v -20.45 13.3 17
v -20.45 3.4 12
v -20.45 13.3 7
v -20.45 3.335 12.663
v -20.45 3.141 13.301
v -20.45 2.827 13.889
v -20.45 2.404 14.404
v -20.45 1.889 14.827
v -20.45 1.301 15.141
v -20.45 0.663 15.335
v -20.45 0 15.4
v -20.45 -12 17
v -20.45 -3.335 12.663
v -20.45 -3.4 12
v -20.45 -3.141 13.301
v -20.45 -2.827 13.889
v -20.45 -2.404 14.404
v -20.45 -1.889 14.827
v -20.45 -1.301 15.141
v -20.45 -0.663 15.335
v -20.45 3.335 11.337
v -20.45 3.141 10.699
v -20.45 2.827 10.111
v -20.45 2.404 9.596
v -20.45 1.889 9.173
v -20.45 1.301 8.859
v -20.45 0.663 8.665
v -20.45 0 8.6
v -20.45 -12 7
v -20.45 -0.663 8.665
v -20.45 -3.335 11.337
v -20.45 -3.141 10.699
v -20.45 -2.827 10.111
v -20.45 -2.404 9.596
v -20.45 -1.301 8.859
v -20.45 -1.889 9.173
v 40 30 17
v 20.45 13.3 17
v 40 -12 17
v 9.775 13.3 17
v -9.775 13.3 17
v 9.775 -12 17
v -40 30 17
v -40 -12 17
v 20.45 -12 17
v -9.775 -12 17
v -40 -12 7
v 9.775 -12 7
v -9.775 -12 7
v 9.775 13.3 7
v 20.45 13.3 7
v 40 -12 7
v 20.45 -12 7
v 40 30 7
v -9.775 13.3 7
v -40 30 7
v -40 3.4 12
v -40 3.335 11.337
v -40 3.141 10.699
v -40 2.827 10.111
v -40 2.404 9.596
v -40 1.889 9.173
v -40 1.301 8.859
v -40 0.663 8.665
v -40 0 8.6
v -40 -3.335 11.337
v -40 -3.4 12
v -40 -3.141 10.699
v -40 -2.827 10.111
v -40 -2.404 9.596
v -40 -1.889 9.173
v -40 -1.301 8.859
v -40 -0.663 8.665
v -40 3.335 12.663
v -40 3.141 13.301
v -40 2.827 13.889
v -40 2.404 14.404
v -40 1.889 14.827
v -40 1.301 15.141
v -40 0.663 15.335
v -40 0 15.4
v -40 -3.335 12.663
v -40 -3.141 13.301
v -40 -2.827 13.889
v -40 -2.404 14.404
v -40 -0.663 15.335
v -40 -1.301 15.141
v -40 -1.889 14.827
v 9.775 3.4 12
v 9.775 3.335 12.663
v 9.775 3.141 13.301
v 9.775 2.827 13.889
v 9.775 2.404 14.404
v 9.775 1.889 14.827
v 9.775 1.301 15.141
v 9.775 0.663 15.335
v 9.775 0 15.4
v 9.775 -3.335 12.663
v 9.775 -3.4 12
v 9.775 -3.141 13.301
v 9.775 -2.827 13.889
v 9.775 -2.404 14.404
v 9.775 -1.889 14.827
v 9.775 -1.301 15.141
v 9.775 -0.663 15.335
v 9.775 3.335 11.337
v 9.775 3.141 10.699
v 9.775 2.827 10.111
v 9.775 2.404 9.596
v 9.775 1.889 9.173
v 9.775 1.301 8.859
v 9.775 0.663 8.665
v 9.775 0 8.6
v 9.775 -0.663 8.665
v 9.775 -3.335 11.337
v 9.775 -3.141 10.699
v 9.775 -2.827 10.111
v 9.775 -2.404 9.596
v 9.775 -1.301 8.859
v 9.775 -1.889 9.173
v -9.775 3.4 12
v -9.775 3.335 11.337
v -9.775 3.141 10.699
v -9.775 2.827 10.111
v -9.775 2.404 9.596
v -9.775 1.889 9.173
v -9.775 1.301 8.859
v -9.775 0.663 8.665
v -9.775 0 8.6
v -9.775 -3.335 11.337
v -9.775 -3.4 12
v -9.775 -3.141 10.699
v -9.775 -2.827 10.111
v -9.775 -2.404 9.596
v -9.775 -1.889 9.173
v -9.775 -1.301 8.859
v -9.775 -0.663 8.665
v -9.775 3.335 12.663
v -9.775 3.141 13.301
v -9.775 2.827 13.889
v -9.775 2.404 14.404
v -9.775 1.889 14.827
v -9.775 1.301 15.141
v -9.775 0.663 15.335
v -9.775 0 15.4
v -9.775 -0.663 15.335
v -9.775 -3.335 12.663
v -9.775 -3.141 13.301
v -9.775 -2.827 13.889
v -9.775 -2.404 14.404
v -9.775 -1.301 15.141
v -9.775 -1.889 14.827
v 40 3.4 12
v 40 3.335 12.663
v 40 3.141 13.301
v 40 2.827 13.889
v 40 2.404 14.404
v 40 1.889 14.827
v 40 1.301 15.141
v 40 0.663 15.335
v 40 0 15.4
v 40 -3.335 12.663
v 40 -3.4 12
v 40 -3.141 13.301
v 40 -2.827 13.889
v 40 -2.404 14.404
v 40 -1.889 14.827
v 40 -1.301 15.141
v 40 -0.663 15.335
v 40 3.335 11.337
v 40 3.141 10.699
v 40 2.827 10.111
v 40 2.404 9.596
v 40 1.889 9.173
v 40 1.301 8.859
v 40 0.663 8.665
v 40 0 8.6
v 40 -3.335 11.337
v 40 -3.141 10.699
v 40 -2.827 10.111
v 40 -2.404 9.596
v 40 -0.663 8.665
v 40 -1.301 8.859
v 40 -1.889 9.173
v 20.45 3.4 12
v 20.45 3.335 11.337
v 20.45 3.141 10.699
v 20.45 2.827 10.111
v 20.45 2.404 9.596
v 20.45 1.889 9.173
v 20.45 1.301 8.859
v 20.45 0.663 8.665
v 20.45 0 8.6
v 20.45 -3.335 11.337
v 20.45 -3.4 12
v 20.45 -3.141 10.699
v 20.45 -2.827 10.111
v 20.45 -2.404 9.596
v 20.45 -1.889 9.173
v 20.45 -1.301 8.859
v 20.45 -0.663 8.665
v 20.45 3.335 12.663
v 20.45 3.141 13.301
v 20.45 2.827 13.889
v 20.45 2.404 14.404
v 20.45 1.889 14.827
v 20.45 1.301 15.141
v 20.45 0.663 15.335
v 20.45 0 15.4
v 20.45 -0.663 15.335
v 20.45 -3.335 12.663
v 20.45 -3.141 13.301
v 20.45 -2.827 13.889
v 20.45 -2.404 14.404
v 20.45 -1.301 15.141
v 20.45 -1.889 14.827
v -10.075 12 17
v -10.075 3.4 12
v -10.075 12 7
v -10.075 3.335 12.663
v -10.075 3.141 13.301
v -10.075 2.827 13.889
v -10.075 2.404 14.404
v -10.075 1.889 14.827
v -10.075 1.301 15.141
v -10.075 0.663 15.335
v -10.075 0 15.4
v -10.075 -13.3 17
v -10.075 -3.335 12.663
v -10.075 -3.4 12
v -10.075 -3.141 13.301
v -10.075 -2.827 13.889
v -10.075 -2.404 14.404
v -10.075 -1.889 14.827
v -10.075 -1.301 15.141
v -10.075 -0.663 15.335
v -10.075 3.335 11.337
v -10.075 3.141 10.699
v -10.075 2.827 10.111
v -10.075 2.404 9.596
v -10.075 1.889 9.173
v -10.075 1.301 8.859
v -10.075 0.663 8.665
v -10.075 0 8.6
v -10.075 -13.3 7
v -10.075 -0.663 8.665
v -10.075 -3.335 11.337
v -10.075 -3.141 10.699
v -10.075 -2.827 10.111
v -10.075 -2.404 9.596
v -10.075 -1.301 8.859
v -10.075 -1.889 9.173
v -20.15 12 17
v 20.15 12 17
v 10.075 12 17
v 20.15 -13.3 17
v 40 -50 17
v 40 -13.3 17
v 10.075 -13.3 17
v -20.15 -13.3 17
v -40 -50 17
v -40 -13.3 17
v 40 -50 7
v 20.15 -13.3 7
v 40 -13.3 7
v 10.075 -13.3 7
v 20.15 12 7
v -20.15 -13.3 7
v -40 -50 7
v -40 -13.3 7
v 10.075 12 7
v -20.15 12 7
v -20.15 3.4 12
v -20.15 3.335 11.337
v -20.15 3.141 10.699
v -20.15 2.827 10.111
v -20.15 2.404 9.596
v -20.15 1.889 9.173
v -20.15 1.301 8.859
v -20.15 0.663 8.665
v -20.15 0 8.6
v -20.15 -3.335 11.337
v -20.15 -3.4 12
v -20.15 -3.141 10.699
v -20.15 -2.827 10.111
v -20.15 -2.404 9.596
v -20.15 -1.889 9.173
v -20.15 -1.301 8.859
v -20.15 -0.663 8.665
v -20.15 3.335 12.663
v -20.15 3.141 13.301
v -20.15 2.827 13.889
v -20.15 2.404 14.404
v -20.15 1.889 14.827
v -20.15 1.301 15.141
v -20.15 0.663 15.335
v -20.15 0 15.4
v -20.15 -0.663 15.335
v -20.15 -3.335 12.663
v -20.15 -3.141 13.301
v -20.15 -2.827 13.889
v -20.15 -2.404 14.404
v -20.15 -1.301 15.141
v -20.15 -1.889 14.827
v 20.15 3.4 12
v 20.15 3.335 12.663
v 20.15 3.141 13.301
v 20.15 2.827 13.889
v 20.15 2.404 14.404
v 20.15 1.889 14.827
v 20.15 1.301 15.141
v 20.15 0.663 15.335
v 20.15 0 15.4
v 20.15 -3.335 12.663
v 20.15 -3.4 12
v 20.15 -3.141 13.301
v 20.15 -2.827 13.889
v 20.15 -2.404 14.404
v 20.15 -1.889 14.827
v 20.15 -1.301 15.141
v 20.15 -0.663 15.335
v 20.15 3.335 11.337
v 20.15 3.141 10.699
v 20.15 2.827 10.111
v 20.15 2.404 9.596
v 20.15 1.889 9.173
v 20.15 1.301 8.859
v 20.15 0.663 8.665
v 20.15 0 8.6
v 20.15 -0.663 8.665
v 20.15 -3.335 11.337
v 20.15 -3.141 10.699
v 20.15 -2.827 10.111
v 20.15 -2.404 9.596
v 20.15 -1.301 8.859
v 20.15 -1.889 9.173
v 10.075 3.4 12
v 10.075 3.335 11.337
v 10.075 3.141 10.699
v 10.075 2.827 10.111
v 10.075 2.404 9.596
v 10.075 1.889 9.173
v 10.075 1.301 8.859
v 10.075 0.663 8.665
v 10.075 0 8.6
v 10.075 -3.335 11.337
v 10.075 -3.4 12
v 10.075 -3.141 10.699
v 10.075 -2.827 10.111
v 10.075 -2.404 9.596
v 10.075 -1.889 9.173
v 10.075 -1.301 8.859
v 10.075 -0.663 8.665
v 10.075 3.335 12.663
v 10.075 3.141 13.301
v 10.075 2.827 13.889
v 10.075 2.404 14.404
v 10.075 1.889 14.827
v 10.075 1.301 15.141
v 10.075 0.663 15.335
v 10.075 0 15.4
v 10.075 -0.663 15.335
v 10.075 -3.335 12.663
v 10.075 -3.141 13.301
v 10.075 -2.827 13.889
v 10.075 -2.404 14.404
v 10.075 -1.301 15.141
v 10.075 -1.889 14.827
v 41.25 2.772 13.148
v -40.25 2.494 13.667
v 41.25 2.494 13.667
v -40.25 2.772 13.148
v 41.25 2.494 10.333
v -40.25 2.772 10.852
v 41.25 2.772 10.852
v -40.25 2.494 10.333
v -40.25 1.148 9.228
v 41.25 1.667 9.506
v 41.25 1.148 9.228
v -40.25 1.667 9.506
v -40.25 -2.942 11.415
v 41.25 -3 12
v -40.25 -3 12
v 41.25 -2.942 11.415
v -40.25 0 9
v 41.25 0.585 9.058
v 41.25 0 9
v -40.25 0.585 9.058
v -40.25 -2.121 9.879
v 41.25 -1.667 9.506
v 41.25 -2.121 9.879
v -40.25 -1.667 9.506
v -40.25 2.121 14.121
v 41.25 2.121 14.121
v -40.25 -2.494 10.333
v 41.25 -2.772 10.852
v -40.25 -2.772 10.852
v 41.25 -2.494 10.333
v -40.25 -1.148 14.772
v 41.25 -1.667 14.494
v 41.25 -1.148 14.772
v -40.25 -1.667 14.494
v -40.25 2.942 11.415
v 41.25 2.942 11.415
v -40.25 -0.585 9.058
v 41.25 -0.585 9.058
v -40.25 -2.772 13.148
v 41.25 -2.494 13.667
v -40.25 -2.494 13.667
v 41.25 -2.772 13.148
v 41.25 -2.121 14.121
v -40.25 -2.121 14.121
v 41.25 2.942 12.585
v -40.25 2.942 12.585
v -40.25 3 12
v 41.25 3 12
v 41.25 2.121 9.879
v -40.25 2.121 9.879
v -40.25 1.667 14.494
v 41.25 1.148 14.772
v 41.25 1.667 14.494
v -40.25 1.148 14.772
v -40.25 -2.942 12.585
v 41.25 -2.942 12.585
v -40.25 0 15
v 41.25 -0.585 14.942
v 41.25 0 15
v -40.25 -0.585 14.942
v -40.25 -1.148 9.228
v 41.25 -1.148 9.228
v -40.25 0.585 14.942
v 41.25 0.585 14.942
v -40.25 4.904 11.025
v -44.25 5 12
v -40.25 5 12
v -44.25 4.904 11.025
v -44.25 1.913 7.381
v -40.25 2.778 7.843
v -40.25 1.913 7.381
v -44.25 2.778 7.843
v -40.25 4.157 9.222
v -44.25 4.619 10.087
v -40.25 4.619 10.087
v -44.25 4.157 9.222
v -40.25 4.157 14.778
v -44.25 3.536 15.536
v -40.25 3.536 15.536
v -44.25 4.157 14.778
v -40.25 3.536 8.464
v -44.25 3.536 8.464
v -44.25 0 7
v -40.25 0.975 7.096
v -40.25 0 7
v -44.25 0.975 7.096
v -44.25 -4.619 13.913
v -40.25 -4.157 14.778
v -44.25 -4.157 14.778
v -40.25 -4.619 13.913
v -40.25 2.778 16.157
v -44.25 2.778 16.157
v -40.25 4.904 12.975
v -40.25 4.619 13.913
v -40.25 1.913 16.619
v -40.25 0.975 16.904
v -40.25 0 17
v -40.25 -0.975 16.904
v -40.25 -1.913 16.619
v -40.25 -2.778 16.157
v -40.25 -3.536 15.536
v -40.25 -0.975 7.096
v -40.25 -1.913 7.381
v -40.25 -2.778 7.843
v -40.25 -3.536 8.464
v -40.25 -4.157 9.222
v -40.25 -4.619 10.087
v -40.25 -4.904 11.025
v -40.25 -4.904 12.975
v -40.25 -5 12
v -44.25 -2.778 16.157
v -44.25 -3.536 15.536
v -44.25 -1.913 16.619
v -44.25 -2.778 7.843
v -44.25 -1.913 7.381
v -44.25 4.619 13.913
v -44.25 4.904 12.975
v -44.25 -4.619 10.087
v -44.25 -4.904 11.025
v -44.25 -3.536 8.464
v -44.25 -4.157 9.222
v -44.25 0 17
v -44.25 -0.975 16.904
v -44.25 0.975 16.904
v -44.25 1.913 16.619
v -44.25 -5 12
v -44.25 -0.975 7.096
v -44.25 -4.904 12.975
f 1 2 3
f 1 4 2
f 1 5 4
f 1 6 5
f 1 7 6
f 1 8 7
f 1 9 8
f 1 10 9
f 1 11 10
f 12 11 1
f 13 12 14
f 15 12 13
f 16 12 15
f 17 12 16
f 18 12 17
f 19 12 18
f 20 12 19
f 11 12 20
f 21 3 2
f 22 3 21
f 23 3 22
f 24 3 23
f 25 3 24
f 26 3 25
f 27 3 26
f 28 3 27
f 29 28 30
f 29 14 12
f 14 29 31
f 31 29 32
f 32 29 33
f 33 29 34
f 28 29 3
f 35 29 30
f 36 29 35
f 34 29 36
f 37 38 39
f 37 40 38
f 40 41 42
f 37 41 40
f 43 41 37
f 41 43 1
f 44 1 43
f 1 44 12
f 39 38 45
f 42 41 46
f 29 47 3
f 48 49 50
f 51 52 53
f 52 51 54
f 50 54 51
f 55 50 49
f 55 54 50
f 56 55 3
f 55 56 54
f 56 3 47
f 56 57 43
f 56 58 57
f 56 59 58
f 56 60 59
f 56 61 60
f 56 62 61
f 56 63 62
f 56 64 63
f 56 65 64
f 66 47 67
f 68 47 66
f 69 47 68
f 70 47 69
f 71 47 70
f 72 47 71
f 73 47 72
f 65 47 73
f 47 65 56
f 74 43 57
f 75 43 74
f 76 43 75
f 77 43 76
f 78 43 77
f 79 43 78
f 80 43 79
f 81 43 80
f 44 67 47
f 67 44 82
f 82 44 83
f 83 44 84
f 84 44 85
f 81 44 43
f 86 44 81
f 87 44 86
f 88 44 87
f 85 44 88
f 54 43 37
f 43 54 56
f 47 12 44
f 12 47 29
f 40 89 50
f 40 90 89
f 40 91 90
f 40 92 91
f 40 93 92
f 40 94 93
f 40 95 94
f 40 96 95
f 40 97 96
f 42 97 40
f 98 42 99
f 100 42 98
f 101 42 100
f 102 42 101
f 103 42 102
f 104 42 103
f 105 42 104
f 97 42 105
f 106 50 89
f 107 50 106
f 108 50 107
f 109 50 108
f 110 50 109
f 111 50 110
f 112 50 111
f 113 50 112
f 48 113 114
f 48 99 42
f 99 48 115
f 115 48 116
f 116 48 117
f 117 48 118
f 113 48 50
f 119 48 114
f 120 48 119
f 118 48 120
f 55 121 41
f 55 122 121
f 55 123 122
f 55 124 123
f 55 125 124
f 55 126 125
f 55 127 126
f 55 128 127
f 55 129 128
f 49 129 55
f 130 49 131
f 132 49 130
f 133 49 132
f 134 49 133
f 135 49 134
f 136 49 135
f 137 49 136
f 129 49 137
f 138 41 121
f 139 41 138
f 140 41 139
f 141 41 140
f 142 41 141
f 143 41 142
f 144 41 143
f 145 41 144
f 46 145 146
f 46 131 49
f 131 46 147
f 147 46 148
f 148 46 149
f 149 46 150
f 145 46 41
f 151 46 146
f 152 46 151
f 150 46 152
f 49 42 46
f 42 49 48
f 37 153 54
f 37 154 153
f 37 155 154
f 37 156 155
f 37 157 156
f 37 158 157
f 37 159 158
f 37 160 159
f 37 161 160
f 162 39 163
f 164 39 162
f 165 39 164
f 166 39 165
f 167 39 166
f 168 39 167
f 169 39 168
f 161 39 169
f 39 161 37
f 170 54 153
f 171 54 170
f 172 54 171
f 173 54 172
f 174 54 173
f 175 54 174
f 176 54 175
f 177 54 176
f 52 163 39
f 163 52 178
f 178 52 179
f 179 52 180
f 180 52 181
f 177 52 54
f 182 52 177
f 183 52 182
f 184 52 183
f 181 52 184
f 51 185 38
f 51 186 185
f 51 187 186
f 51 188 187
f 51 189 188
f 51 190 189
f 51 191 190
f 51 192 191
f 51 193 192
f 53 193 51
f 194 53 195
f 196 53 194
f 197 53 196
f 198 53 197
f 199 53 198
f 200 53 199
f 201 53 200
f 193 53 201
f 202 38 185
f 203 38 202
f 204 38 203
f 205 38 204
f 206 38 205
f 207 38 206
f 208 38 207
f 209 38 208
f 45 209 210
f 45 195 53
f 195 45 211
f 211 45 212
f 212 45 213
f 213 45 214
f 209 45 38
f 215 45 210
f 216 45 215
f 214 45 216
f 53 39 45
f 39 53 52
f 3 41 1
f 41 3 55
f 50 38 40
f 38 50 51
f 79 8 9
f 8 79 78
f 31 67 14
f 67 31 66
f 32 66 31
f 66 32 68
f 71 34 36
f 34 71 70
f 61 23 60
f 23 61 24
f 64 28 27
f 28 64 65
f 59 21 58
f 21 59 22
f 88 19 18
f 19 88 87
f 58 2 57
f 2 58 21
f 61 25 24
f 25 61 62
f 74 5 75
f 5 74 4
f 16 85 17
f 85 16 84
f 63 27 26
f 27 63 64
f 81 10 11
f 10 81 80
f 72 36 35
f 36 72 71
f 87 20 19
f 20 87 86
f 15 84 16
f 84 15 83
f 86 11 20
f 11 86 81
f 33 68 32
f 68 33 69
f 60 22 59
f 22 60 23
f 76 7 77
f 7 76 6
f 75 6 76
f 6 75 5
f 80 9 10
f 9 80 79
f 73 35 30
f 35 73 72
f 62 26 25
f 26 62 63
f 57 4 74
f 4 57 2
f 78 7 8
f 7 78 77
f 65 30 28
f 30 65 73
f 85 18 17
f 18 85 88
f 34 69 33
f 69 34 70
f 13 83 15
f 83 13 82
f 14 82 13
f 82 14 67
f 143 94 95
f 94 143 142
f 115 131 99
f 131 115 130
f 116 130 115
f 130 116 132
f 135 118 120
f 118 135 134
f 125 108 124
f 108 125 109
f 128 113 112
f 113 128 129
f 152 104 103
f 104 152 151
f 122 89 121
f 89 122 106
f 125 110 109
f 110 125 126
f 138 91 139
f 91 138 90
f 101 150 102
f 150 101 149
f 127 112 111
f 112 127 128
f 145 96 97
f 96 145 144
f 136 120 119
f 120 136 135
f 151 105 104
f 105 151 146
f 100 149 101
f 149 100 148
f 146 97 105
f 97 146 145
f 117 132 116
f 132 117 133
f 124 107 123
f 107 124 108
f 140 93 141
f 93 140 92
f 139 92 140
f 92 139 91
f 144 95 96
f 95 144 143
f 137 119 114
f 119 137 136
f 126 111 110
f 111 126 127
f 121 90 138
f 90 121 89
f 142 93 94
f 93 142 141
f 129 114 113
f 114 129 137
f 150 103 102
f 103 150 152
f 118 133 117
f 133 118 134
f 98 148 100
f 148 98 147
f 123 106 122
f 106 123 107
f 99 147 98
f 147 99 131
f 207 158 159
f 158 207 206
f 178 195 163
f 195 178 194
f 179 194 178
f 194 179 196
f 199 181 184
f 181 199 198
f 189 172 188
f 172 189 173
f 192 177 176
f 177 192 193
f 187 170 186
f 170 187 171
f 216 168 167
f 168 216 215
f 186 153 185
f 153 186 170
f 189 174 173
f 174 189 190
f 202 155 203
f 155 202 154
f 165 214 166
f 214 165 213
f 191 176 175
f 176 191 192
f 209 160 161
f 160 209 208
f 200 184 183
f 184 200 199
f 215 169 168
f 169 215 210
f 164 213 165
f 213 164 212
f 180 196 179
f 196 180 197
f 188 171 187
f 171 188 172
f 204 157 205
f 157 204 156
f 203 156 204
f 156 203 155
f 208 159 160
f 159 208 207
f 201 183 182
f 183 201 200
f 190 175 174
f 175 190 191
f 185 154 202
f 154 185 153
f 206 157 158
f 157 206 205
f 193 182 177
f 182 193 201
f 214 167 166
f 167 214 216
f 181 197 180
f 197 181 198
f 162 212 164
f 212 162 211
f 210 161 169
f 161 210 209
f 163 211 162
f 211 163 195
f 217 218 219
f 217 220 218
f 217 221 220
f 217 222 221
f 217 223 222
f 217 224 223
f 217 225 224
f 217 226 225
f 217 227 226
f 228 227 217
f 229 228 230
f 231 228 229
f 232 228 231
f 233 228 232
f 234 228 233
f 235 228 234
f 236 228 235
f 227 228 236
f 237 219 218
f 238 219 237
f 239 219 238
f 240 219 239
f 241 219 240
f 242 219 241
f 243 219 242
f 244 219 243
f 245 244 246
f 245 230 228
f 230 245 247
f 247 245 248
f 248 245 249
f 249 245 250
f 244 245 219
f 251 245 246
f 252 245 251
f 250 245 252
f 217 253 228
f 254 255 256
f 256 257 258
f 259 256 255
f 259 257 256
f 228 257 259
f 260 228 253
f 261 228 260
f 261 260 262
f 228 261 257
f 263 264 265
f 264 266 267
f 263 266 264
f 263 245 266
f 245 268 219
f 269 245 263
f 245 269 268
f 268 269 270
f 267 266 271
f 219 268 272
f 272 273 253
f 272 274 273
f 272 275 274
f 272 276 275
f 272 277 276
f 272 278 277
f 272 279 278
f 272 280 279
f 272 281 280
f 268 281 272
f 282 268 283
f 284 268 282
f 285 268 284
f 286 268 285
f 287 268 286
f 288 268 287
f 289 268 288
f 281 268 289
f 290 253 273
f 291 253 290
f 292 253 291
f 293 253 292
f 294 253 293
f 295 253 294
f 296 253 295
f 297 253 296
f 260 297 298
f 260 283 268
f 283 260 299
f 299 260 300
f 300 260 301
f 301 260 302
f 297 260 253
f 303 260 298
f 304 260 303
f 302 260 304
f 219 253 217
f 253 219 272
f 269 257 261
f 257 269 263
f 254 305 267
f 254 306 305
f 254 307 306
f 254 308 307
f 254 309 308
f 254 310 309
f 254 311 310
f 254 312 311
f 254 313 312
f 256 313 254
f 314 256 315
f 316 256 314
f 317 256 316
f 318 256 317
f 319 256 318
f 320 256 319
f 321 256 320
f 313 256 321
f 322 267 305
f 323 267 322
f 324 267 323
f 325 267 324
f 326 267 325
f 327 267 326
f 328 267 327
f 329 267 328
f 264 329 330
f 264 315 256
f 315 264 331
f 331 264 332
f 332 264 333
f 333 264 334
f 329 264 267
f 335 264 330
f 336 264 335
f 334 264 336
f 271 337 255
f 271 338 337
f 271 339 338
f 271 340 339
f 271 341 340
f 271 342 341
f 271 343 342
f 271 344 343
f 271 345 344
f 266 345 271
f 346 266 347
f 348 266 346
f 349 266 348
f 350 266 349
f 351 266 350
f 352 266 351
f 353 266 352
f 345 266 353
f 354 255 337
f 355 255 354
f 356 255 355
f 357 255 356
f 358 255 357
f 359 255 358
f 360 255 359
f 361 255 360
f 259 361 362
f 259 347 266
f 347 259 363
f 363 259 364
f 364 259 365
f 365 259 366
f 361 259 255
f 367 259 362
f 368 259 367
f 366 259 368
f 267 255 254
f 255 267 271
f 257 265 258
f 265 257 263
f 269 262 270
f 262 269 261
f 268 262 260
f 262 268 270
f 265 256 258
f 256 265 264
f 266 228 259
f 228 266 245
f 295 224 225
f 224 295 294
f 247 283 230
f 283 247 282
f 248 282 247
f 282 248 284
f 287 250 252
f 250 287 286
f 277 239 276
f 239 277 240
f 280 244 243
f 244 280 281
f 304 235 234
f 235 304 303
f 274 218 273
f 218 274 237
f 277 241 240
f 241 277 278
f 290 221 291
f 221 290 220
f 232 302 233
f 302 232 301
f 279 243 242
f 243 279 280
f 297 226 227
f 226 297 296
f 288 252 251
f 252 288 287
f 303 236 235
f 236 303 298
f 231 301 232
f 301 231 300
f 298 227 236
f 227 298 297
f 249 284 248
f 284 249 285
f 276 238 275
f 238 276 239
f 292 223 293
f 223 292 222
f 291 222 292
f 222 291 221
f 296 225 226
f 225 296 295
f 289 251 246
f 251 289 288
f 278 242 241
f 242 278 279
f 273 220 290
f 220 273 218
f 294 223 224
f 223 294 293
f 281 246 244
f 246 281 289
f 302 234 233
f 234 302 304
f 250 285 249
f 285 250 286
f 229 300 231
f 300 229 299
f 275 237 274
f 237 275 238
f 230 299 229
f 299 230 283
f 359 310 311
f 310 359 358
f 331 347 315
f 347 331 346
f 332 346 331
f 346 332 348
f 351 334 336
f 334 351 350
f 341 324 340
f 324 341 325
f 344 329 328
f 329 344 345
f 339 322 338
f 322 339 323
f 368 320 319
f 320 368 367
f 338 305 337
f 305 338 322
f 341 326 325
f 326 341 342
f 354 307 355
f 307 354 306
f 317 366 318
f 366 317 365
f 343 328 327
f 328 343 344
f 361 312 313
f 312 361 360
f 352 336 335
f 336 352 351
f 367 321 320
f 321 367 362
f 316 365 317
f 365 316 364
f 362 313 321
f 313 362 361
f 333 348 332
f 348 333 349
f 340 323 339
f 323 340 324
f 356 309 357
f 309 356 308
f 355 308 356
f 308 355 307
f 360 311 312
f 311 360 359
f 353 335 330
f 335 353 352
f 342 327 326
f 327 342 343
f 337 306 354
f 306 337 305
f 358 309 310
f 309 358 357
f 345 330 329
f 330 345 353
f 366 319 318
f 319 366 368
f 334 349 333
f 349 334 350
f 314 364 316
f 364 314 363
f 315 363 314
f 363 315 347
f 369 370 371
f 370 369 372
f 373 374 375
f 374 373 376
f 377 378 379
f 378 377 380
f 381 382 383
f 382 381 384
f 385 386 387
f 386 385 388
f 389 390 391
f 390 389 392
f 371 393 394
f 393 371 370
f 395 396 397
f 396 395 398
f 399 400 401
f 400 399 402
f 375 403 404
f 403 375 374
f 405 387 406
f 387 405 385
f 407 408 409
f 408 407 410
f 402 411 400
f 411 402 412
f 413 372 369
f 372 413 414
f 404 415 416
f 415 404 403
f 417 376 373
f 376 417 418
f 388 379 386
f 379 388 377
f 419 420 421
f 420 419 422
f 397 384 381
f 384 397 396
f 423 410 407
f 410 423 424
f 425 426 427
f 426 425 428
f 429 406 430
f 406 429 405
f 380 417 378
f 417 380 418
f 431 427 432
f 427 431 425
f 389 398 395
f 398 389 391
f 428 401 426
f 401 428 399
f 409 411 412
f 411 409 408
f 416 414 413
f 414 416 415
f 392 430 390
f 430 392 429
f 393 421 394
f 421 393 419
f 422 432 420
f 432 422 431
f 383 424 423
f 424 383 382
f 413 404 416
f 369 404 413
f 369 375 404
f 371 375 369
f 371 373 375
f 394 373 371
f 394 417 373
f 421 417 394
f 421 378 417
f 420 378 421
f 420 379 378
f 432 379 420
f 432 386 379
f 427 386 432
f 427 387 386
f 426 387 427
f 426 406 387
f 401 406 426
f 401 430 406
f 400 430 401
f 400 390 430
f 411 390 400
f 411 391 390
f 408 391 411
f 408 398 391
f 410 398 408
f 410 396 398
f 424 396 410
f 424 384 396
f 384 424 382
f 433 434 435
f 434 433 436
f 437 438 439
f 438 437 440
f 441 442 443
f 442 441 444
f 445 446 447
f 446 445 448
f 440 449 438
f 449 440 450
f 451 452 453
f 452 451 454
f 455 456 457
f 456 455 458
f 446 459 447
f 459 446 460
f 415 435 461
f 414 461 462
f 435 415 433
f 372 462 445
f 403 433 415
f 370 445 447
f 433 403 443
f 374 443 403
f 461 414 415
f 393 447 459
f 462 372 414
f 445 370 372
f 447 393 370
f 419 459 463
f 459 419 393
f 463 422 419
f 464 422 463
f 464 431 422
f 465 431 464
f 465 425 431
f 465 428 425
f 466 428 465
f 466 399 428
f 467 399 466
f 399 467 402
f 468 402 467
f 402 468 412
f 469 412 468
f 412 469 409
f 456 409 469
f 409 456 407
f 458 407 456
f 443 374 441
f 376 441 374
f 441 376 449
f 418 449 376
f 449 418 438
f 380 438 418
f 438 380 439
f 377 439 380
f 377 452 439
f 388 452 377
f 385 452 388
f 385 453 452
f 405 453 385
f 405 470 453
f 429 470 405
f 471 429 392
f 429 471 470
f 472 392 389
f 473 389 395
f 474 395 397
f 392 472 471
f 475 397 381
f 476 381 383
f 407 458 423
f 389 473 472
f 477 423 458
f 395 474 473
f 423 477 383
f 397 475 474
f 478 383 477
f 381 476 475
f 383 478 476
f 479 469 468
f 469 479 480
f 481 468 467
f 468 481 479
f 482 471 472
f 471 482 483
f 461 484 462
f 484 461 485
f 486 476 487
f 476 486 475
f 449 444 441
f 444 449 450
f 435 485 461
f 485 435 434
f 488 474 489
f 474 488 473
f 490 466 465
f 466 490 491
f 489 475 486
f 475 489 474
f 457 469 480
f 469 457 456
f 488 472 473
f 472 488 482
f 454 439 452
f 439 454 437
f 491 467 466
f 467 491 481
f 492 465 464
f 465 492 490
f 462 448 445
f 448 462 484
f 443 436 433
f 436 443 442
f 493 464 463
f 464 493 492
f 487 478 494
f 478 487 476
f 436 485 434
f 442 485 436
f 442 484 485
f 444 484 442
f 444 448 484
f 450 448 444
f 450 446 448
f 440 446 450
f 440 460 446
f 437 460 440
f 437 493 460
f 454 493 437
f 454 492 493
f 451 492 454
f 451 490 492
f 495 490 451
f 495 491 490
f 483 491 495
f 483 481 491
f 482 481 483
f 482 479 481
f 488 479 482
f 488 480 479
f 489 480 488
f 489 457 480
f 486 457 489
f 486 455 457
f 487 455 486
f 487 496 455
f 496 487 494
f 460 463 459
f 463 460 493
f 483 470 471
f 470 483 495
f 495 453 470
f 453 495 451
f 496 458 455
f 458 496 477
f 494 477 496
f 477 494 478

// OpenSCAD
$fn = 32;

// ------------------------------------------------------------------------
// Butt hinge: hinge 80 mm, leaf swung 0 deg
// Every part is its own module, assembly() places every instance.
// ------------------------------------------------------------------------

// --- part 1 ---
module hinge_base() {
  difference() {
    union() {
      translate([-40, -12, -5]) cube([19.55, 42, 10]);
      translate([-9.775, -12, -5]) cube([19.55, 42, 10]);
      translate([20.45, -12, -5]) cube([19.55, 42, 10]);
      translate([-40, 13.3, -5]) cube([80, 16.7, 10]);
    }
    translate([-30.225, 0, 0]) rotate([0, 90, 0]) cylinder(h = 21.55, d = 6.8, center = true);
    translate([0, 0, 0]) rotate([0, 90, 0]) cylinder(h = 21.55, d = 6.8, center = true);
    translate([30.225, 0, 0]) rotate([0, 90, 0]) cylinder(h = 21.55, d = 6.8, center = true);
  }
}

// --- part 2 ---
module hinge_mover() {
  difference() {
    union() {
      translate([-20.15, -50, -5]) cube([10.075, 62, 10]);
      translate([10.075, -50, -5]) cube([10.075, 62, 10]);
      translate([-40, -50, -5]) cube([80, 36.7, 10]);
    }
    translate([-15.113, 0, 0]) rotate([0, 90, 0]) cylinder(h = 12.075, d = 6.8, center = true);
    translate([15.113, 0, 0]) rotate([0, 90, 0]) cylinder(h = 12.075, d = 6.8, center = true);
  }
}

// --- part 3 ---
module hinge_pin() {
  rotate([0, 90, 0]) cylinder(h = 82.5, d = 6, center = true);
  translate([-44.25, 0, 0]) rotate([0, 90, 0]) cylinder(h = 4, d = 10);
}

// --- assembly ---
module assembly() {
  color([0.80, 0.24, 0.20]) translate([0, 0, 12]) rotate([0, 0, 0]) hinge_base();
  color([0.20, 0.45, 0.75]) translate([0, 0, 12]) rotate([0, 0, 0]) hinge_mover();
  color([0.25, 0.62, 0.32]) translate([0, 0, 12]) rotate([0, 0, 0]) hinge_pin();
}

assembly();
